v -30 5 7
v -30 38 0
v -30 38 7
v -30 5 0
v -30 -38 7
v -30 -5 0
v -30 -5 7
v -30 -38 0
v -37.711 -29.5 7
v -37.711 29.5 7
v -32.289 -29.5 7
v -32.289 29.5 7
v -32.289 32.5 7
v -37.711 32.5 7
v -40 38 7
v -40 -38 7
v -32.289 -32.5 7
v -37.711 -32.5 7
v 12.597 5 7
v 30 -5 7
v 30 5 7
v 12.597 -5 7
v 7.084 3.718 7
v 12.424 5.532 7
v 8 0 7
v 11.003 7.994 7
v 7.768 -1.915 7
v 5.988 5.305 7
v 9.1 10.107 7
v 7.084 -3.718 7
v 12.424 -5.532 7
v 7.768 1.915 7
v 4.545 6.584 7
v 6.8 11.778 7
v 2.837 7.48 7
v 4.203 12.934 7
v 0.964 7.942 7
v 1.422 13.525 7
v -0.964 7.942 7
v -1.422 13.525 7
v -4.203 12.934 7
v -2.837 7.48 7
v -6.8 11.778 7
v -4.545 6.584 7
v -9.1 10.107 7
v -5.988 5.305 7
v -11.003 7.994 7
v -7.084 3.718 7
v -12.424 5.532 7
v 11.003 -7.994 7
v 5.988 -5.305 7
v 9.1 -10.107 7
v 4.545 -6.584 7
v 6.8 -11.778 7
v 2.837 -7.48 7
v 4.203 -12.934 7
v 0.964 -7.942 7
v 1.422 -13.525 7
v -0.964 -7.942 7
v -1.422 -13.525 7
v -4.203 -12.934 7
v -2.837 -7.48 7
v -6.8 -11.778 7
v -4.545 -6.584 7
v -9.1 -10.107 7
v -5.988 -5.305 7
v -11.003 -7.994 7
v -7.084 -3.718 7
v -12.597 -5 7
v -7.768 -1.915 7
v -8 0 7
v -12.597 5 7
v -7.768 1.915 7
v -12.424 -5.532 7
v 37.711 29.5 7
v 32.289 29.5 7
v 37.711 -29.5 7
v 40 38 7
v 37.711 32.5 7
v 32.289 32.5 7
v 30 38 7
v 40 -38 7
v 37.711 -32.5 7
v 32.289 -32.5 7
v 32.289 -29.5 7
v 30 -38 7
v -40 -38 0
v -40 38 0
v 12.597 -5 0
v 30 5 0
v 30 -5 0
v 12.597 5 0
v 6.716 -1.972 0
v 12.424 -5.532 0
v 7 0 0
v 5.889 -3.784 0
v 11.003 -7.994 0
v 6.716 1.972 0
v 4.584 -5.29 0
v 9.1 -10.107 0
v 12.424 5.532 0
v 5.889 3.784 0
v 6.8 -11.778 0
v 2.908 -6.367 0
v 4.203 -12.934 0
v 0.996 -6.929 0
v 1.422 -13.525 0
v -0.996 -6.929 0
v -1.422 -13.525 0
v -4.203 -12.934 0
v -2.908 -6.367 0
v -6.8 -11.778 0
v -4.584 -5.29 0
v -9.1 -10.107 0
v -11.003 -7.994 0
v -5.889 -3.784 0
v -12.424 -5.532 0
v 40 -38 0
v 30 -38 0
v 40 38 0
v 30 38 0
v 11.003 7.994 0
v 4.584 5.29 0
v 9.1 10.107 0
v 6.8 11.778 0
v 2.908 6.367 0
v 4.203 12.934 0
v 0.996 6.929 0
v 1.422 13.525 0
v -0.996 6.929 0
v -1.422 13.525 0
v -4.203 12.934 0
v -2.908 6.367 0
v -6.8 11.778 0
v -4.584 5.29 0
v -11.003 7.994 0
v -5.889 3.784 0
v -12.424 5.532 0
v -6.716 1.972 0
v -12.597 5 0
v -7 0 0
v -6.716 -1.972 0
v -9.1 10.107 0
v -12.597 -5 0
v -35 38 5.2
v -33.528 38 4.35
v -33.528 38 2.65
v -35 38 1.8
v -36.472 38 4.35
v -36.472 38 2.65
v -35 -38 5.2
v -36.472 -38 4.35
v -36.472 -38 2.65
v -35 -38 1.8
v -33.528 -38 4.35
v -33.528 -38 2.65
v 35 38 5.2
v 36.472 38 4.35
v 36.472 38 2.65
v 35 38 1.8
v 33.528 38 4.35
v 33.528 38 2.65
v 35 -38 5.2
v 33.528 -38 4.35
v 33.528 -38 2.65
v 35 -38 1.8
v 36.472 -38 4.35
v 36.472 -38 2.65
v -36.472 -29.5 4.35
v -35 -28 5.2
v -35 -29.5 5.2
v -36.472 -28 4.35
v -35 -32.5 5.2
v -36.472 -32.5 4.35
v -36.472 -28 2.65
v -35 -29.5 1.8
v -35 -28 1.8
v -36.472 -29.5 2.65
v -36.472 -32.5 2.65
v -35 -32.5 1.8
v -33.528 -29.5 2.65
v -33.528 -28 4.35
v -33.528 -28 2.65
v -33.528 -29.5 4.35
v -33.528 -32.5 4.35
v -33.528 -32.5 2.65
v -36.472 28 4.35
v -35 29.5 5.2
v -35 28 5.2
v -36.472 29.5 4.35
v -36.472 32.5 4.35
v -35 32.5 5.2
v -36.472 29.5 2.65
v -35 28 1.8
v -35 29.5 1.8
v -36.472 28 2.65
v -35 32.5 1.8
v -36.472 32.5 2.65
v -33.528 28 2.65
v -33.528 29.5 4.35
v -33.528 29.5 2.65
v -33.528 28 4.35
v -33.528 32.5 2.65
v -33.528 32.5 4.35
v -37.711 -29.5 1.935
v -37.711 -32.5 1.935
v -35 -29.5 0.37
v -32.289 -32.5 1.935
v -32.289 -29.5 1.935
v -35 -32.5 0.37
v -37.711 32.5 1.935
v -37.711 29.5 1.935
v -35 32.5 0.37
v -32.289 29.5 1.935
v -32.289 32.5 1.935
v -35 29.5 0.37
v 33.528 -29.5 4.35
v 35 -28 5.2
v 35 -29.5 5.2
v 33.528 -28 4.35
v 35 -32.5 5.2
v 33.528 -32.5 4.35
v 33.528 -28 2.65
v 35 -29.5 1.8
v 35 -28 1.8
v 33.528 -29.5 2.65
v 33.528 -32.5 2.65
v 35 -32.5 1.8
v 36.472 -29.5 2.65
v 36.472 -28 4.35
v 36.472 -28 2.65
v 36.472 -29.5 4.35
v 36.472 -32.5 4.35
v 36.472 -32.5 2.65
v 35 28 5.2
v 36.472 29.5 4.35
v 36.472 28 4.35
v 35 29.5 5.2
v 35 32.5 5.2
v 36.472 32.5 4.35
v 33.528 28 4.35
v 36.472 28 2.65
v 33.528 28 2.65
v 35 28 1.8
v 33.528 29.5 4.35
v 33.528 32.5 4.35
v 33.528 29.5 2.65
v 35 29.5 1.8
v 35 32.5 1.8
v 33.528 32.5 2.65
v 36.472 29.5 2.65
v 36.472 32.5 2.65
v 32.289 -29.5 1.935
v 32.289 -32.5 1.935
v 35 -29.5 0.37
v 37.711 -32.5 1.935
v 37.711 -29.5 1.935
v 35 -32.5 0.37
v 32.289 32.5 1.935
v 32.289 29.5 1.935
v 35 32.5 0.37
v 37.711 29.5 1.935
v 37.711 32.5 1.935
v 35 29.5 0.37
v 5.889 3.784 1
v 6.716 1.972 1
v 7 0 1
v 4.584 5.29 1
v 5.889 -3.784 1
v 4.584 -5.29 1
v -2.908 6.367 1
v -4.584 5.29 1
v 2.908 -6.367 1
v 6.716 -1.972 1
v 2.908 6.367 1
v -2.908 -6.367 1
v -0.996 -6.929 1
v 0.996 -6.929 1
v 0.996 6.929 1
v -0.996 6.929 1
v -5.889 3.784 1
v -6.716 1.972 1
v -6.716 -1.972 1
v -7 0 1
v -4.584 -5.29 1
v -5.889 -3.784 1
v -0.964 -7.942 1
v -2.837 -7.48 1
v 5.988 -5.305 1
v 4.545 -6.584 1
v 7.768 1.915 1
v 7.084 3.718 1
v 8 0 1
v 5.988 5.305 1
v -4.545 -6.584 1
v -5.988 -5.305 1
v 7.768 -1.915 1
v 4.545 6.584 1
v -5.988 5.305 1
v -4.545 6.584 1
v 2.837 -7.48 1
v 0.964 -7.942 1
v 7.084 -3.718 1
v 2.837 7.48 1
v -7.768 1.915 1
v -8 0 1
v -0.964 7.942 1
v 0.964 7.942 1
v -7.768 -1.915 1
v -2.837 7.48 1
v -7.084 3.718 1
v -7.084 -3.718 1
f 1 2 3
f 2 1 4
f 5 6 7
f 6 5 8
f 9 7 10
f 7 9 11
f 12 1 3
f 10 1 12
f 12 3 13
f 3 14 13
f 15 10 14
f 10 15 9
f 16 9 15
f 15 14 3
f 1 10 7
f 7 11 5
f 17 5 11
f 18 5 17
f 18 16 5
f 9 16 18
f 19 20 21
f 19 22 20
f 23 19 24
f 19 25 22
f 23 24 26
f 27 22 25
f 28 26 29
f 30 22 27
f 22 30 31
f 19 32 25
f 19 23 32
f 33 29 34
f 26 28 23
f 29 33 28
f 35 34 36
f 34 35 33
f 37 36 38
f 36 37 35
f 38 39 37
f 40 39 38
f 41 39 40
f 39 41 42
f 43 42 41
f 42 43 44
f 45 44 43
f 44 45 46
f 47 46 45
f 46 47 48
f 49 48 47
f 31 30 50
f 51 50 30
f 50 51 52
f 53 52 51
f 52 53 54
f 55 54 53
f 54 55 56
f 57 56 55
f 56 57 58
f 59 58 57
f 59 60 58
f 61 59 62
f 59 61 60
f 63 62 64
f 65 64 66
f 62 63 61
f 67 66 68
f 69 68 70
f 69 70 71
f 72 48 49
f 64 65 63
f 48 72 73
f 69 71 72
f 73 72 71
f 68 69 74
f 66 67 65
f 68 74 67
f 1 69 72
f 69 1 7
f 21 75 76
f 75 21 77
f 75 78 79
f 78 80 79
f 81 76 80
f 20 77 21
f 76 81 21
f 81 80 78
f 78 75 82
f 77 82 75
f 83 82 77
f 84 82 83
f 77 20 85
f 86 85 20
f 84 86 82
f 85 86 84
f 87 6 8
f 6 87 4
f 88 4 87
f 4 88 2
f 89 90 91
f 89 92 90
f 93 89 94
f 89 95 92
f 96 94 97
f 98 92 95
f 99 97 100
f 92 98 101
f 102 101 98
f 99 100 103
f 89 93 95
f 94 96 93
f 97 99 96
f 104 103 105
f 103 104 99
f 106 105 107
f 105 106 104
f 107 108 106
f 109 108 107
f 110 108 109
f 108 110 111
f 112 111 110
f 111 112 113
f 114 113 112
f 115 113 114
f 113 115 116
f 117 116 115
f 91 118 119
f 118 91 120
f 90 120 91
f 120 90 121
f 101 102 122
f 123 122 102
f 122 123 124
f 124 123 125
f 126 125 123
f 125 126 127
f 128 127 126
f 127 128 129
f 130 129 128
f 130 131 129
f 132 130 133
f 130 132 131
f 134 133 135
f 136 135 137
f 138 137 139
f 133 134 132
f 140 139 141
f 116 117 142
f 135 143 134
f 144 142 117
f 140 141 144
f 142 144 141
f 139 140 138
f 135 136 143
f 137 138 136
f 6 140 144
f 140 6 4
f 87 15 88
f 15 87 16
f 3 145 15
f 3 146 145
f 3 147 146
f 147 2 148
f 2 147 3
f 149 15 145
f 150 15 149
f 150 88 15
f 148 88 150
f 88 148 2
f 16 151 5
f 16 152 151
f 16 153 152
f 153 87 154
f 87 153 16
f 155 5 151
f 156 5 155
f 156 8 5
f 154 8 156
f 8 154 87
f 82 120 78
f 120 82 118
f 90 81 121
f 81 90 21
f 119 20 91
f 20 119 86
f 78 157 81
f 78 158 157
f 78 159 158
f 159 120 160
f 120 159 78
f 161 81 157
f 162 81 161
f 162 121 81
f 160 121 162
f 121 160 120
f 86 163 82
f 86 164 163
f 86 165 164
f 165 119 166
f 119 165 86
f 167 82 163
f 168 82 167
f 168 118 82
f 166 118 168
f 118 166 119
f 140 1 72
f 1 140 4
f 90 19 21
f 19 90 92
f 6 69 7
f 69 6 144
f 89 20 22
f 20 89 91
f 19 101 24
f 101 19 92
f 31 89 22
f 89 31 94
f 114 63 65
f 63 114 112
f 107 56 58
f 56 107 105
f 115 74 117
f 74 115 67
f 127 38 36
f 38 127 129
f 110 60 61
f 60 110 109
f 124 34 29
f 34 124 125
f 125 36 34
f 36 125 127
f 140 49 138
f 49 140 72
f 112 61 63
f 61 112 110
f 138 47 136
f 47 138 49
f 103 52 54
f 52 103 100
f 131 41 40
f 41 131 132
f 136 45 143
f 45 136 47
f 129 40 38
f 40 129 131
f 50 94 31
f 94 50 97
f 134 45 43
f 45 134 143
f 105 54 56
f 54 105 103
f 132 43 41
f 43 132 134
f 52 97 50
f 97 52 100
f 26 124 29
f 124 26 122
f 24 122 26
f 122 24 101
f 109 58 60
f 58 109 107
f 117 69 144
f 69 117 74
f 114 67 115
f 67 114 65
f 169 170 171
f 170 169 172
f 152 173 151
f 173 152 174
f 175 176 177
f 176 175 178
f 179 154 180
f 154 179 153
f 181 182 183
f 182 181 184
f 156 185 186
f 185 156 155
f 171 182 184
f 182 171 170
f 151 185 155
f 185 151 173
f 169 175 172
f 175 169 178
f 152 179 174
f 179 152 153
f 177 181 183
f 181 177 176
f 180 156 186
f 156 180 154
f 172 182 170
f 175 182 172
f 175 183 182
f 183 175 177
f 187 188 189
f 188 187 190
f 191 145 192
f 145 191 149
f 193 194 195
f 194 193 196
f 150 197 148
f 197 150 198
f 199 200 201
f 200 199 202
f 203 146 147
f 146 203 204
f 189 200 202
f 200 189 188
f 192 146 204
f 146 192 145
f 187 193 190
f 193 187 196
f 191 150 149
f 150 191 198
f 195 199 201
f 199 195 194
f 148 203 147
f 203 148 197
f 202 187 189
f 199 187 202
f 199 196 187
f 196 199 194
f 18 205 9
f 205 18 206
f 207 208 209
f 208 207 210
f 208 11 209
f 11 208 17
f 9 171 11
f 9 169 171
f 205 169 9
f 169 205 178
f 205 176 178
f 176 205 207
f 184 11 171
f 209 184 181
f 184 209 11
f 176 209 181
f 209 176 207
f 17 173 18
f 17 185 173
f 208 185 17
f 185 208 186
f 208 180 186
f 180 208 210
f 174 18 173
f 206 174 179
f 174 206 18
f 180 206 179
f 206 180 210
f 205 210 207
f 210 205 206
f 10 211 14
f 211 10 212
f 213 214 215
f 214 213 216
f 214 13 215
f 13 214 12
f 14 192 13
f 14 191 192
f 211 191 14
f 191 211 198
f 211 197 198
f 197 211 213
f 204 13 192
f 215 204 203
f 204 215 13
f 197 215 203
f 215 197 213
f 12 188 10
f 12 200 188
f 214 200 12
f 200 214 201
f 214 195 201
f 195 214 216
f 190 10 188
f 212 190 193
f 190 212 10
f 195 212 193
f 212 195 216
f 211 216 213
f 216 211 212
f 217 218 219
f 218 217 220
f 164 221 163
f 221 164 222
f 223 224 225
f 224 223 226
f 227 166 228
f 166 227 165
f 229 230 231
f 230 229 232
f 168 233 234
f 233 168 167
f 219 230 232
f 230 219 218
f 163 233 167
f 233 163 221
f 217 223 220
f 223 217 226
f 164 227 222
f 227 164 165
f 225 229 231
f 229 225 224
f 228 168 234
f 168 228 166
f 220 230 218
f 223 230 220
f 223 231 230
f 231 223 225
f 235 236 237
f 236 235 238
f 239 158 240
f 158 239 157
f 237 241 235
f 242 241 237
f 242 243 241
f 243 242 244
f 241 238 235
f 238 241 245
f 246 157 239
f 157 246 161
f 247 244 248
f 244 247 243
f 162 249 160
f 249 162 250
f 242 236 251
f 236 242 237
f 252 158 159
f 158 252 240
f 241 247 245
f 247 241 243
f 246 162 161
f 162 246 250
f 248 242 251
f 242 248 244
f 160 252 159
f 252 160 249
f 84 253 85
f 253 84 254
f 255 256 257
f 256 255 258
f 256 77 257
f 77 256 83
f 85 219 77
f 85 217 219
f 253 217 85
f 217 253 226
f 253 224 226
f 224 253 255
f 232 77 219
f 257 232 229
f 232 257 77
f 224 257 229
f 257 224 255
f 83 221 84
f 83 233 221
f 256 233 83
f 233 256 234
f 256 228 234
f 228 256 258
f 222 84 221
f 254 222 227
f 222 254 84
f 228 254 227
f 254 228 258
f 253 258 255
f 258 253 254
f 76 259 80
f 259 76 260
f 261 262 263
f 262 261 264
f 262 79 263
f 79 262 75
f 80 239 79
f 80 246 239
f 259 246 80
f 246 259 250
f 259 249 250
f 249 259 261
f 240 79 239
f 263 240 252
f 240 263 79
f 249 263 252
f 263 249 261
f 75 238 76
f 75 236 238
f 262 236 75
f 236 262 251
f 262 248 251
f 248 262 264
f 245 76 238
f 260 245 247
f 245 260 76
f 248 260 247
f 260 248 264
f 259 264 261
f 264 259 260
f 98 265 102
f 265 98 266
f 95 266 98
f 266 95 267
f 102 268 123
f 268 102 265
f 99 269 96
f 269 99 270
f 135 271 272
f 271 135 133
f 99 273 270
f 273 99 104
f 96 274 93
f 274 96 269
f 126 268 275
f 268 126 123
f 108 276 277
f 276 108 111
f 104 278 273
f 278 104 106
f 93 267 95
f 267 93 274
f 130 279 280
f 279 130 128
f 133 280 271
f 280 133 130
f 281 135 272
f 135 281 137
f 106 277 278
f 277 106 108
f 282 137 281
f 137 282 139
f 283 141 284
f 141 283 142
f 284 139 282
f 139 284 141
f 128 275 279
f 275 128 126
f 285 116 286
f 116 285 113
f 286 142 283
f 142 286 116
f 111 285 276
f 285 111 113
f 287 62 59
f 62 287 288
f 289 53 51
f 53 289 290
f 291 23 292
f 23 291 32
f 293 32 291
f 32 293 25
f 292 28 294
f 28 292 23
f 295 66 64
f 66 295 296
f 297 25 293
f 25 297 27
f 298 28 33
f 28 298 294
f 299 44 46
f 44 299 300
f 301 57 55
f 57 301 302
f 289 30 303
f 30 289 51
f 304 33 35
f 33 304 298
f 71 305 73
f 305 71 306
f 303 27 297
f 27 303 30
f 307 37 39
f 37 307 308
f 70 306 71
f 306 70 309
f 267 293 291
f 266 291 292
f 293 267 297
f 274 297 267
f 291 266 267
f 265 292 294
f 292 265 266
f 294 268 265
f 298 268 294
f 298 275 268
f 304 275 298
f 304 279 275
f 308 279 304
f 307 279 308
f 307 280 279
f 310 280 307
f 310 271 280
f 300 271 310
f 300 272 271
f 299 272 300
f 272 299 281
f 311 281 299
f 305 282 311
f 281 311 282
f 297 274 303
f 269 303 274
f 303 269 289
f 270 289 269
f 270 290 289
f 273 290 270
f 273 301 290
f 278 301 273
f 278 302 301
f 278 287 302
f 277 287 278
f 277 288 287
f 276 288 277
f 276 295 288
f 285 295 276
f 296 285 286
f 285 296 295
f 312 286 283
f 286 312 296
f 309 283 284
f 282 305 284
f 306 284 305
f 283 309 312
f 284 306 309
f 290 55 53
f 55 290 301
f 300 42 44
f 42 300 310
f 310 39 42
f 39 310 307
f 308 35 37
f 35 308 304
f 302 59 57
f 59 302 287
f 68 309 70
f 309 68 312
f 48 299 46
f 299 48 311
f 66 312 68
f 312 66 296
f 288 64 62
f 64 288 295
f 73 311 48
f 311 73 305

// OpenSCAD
// file: constants.scad
/* sinusoid-plotter: A parametric sinusoid plotter made with OpenSCAD.
 * Copyright (C) 2013  Clayton G. Hobbs
 * 
 * This program is free software: you can redistribute it and/or modify
 * it under the terms of the GNU General Public License as published by
 * the Free Software Foundation, either version 3 of the License, or
 * (at your option) any later version.
 * 
 * This program is distributed in the hope that it will be useful,
 * but WITHOUT ANY WARRANTY; without even the implied warranty of
 * MERCHANTABILITY or FITNESS FOR A PARTICULAR PURPOSE.  See the
 * GNU General Public License for more details.
 * 
 * You should have received a copy of the GNU General Public License
 * along with this program.  If not, see <http://www.gnu.org/licenses/>.
 */

pi = 3.1415926535897932384626433832795;
// main file
/* sinusoid-plotter: A parametric sinusoid plotter made with OpenSCAD.
 * Copyright (C) 2013  Clayton G. Hobbs
 * 
 * This program is free software: you can redistribute it and/or modify
 * it under the terms of the GNU General Public License as published by
 * the Free Software Foundation, either version 3 of the License, or
 * (at your option) any later version.
 * 
 * This program is distributed in the hope that it will be useful,
 * but WITHOUT ANY WARRANTY; without even the implied warranty of
 * MERCHANTABILITY or FITNESS FOR A PARTICULAR PURPOSE.  See the
 * GNU General Public License for more details.
 * 
 * You should have received a copy of the GNU General Public License
 * along with this program.  If not, see <http://www.gnu.org/licenses/>.
 */

include <constants.scad>;

module h_beam(size, bar_thickness, bearing_radius, bearing_rim,
              bearing_thickness, hole_radius, hole_depth, nut_radius,
              nut_thickness, nut_depth)
{
	difference() {
		union() {
			translate([-size[0]/2, -size[1]/2, 0])
			cube([bar_thickness, size[1], size[2]]);

			translate([size[0]/2 - bar_thickness, -size[1]/2, 0])
			cube([bar_thickness, size[1], size[2]]);

			translate([-size[0]/2 + bar_thickness, -bar_thickness/2, 0])
			cube([size[0] - bar_thickness*2, bar_thickness, size[2]]);

			cylinder(r = bearing_radius*1.7, h = size[2]);
		}

		// Smaller bearing hole
		translate([0, 0, -1])
		cylinder(r = bearing_radius - bearing_rim, h = size[2] + 2);

		// Larger bearing hole
		translate([0, 0, (size[2] - bearing_thickness)/2])
		cylinder(r = bearing_radius, h = size[2]);

		// Screw holes and nut traps
		for (x = [(-size[0] + bar_thickness)/2, (size[0] - bar_thickness)/2]) {
			for (y = [-size[1]/2, size[1]/2]) {
				translate([x, y, size[2]/2])
				rotate([90, 30, 0])
				cylinder(r = hole_radius, h = hole_depth*2, center=true);
			}
			for (y = [-size[1]/2 + nut_depth, size[1]/2 - nut_depth]) {
				hull() {
					translate([x, y, size[2]/2])
					rotate([90, 30, 0])
					cylinder(r = nut_radius, h = nut_thickness, center=true,
                             $fn=6);

					translate([x, y, size[2] + nut_radius])
					rotate([90, 30, 0])
					cylinder(r = nut_radius, h = nut_thickness, center=true,
                             $fn=6);
				}
			}
		}
	}
}

h_beam(size = [80, 76, 7], bar_thickness = 10, bearing_radius = 8,
       bearing_rim = 1, bearing_thickness = 5, hole_radius = 1.7,
       hole_depth = 10, nut_radius = 3.13, nut_thickness = 3, nut_depth = 7);
